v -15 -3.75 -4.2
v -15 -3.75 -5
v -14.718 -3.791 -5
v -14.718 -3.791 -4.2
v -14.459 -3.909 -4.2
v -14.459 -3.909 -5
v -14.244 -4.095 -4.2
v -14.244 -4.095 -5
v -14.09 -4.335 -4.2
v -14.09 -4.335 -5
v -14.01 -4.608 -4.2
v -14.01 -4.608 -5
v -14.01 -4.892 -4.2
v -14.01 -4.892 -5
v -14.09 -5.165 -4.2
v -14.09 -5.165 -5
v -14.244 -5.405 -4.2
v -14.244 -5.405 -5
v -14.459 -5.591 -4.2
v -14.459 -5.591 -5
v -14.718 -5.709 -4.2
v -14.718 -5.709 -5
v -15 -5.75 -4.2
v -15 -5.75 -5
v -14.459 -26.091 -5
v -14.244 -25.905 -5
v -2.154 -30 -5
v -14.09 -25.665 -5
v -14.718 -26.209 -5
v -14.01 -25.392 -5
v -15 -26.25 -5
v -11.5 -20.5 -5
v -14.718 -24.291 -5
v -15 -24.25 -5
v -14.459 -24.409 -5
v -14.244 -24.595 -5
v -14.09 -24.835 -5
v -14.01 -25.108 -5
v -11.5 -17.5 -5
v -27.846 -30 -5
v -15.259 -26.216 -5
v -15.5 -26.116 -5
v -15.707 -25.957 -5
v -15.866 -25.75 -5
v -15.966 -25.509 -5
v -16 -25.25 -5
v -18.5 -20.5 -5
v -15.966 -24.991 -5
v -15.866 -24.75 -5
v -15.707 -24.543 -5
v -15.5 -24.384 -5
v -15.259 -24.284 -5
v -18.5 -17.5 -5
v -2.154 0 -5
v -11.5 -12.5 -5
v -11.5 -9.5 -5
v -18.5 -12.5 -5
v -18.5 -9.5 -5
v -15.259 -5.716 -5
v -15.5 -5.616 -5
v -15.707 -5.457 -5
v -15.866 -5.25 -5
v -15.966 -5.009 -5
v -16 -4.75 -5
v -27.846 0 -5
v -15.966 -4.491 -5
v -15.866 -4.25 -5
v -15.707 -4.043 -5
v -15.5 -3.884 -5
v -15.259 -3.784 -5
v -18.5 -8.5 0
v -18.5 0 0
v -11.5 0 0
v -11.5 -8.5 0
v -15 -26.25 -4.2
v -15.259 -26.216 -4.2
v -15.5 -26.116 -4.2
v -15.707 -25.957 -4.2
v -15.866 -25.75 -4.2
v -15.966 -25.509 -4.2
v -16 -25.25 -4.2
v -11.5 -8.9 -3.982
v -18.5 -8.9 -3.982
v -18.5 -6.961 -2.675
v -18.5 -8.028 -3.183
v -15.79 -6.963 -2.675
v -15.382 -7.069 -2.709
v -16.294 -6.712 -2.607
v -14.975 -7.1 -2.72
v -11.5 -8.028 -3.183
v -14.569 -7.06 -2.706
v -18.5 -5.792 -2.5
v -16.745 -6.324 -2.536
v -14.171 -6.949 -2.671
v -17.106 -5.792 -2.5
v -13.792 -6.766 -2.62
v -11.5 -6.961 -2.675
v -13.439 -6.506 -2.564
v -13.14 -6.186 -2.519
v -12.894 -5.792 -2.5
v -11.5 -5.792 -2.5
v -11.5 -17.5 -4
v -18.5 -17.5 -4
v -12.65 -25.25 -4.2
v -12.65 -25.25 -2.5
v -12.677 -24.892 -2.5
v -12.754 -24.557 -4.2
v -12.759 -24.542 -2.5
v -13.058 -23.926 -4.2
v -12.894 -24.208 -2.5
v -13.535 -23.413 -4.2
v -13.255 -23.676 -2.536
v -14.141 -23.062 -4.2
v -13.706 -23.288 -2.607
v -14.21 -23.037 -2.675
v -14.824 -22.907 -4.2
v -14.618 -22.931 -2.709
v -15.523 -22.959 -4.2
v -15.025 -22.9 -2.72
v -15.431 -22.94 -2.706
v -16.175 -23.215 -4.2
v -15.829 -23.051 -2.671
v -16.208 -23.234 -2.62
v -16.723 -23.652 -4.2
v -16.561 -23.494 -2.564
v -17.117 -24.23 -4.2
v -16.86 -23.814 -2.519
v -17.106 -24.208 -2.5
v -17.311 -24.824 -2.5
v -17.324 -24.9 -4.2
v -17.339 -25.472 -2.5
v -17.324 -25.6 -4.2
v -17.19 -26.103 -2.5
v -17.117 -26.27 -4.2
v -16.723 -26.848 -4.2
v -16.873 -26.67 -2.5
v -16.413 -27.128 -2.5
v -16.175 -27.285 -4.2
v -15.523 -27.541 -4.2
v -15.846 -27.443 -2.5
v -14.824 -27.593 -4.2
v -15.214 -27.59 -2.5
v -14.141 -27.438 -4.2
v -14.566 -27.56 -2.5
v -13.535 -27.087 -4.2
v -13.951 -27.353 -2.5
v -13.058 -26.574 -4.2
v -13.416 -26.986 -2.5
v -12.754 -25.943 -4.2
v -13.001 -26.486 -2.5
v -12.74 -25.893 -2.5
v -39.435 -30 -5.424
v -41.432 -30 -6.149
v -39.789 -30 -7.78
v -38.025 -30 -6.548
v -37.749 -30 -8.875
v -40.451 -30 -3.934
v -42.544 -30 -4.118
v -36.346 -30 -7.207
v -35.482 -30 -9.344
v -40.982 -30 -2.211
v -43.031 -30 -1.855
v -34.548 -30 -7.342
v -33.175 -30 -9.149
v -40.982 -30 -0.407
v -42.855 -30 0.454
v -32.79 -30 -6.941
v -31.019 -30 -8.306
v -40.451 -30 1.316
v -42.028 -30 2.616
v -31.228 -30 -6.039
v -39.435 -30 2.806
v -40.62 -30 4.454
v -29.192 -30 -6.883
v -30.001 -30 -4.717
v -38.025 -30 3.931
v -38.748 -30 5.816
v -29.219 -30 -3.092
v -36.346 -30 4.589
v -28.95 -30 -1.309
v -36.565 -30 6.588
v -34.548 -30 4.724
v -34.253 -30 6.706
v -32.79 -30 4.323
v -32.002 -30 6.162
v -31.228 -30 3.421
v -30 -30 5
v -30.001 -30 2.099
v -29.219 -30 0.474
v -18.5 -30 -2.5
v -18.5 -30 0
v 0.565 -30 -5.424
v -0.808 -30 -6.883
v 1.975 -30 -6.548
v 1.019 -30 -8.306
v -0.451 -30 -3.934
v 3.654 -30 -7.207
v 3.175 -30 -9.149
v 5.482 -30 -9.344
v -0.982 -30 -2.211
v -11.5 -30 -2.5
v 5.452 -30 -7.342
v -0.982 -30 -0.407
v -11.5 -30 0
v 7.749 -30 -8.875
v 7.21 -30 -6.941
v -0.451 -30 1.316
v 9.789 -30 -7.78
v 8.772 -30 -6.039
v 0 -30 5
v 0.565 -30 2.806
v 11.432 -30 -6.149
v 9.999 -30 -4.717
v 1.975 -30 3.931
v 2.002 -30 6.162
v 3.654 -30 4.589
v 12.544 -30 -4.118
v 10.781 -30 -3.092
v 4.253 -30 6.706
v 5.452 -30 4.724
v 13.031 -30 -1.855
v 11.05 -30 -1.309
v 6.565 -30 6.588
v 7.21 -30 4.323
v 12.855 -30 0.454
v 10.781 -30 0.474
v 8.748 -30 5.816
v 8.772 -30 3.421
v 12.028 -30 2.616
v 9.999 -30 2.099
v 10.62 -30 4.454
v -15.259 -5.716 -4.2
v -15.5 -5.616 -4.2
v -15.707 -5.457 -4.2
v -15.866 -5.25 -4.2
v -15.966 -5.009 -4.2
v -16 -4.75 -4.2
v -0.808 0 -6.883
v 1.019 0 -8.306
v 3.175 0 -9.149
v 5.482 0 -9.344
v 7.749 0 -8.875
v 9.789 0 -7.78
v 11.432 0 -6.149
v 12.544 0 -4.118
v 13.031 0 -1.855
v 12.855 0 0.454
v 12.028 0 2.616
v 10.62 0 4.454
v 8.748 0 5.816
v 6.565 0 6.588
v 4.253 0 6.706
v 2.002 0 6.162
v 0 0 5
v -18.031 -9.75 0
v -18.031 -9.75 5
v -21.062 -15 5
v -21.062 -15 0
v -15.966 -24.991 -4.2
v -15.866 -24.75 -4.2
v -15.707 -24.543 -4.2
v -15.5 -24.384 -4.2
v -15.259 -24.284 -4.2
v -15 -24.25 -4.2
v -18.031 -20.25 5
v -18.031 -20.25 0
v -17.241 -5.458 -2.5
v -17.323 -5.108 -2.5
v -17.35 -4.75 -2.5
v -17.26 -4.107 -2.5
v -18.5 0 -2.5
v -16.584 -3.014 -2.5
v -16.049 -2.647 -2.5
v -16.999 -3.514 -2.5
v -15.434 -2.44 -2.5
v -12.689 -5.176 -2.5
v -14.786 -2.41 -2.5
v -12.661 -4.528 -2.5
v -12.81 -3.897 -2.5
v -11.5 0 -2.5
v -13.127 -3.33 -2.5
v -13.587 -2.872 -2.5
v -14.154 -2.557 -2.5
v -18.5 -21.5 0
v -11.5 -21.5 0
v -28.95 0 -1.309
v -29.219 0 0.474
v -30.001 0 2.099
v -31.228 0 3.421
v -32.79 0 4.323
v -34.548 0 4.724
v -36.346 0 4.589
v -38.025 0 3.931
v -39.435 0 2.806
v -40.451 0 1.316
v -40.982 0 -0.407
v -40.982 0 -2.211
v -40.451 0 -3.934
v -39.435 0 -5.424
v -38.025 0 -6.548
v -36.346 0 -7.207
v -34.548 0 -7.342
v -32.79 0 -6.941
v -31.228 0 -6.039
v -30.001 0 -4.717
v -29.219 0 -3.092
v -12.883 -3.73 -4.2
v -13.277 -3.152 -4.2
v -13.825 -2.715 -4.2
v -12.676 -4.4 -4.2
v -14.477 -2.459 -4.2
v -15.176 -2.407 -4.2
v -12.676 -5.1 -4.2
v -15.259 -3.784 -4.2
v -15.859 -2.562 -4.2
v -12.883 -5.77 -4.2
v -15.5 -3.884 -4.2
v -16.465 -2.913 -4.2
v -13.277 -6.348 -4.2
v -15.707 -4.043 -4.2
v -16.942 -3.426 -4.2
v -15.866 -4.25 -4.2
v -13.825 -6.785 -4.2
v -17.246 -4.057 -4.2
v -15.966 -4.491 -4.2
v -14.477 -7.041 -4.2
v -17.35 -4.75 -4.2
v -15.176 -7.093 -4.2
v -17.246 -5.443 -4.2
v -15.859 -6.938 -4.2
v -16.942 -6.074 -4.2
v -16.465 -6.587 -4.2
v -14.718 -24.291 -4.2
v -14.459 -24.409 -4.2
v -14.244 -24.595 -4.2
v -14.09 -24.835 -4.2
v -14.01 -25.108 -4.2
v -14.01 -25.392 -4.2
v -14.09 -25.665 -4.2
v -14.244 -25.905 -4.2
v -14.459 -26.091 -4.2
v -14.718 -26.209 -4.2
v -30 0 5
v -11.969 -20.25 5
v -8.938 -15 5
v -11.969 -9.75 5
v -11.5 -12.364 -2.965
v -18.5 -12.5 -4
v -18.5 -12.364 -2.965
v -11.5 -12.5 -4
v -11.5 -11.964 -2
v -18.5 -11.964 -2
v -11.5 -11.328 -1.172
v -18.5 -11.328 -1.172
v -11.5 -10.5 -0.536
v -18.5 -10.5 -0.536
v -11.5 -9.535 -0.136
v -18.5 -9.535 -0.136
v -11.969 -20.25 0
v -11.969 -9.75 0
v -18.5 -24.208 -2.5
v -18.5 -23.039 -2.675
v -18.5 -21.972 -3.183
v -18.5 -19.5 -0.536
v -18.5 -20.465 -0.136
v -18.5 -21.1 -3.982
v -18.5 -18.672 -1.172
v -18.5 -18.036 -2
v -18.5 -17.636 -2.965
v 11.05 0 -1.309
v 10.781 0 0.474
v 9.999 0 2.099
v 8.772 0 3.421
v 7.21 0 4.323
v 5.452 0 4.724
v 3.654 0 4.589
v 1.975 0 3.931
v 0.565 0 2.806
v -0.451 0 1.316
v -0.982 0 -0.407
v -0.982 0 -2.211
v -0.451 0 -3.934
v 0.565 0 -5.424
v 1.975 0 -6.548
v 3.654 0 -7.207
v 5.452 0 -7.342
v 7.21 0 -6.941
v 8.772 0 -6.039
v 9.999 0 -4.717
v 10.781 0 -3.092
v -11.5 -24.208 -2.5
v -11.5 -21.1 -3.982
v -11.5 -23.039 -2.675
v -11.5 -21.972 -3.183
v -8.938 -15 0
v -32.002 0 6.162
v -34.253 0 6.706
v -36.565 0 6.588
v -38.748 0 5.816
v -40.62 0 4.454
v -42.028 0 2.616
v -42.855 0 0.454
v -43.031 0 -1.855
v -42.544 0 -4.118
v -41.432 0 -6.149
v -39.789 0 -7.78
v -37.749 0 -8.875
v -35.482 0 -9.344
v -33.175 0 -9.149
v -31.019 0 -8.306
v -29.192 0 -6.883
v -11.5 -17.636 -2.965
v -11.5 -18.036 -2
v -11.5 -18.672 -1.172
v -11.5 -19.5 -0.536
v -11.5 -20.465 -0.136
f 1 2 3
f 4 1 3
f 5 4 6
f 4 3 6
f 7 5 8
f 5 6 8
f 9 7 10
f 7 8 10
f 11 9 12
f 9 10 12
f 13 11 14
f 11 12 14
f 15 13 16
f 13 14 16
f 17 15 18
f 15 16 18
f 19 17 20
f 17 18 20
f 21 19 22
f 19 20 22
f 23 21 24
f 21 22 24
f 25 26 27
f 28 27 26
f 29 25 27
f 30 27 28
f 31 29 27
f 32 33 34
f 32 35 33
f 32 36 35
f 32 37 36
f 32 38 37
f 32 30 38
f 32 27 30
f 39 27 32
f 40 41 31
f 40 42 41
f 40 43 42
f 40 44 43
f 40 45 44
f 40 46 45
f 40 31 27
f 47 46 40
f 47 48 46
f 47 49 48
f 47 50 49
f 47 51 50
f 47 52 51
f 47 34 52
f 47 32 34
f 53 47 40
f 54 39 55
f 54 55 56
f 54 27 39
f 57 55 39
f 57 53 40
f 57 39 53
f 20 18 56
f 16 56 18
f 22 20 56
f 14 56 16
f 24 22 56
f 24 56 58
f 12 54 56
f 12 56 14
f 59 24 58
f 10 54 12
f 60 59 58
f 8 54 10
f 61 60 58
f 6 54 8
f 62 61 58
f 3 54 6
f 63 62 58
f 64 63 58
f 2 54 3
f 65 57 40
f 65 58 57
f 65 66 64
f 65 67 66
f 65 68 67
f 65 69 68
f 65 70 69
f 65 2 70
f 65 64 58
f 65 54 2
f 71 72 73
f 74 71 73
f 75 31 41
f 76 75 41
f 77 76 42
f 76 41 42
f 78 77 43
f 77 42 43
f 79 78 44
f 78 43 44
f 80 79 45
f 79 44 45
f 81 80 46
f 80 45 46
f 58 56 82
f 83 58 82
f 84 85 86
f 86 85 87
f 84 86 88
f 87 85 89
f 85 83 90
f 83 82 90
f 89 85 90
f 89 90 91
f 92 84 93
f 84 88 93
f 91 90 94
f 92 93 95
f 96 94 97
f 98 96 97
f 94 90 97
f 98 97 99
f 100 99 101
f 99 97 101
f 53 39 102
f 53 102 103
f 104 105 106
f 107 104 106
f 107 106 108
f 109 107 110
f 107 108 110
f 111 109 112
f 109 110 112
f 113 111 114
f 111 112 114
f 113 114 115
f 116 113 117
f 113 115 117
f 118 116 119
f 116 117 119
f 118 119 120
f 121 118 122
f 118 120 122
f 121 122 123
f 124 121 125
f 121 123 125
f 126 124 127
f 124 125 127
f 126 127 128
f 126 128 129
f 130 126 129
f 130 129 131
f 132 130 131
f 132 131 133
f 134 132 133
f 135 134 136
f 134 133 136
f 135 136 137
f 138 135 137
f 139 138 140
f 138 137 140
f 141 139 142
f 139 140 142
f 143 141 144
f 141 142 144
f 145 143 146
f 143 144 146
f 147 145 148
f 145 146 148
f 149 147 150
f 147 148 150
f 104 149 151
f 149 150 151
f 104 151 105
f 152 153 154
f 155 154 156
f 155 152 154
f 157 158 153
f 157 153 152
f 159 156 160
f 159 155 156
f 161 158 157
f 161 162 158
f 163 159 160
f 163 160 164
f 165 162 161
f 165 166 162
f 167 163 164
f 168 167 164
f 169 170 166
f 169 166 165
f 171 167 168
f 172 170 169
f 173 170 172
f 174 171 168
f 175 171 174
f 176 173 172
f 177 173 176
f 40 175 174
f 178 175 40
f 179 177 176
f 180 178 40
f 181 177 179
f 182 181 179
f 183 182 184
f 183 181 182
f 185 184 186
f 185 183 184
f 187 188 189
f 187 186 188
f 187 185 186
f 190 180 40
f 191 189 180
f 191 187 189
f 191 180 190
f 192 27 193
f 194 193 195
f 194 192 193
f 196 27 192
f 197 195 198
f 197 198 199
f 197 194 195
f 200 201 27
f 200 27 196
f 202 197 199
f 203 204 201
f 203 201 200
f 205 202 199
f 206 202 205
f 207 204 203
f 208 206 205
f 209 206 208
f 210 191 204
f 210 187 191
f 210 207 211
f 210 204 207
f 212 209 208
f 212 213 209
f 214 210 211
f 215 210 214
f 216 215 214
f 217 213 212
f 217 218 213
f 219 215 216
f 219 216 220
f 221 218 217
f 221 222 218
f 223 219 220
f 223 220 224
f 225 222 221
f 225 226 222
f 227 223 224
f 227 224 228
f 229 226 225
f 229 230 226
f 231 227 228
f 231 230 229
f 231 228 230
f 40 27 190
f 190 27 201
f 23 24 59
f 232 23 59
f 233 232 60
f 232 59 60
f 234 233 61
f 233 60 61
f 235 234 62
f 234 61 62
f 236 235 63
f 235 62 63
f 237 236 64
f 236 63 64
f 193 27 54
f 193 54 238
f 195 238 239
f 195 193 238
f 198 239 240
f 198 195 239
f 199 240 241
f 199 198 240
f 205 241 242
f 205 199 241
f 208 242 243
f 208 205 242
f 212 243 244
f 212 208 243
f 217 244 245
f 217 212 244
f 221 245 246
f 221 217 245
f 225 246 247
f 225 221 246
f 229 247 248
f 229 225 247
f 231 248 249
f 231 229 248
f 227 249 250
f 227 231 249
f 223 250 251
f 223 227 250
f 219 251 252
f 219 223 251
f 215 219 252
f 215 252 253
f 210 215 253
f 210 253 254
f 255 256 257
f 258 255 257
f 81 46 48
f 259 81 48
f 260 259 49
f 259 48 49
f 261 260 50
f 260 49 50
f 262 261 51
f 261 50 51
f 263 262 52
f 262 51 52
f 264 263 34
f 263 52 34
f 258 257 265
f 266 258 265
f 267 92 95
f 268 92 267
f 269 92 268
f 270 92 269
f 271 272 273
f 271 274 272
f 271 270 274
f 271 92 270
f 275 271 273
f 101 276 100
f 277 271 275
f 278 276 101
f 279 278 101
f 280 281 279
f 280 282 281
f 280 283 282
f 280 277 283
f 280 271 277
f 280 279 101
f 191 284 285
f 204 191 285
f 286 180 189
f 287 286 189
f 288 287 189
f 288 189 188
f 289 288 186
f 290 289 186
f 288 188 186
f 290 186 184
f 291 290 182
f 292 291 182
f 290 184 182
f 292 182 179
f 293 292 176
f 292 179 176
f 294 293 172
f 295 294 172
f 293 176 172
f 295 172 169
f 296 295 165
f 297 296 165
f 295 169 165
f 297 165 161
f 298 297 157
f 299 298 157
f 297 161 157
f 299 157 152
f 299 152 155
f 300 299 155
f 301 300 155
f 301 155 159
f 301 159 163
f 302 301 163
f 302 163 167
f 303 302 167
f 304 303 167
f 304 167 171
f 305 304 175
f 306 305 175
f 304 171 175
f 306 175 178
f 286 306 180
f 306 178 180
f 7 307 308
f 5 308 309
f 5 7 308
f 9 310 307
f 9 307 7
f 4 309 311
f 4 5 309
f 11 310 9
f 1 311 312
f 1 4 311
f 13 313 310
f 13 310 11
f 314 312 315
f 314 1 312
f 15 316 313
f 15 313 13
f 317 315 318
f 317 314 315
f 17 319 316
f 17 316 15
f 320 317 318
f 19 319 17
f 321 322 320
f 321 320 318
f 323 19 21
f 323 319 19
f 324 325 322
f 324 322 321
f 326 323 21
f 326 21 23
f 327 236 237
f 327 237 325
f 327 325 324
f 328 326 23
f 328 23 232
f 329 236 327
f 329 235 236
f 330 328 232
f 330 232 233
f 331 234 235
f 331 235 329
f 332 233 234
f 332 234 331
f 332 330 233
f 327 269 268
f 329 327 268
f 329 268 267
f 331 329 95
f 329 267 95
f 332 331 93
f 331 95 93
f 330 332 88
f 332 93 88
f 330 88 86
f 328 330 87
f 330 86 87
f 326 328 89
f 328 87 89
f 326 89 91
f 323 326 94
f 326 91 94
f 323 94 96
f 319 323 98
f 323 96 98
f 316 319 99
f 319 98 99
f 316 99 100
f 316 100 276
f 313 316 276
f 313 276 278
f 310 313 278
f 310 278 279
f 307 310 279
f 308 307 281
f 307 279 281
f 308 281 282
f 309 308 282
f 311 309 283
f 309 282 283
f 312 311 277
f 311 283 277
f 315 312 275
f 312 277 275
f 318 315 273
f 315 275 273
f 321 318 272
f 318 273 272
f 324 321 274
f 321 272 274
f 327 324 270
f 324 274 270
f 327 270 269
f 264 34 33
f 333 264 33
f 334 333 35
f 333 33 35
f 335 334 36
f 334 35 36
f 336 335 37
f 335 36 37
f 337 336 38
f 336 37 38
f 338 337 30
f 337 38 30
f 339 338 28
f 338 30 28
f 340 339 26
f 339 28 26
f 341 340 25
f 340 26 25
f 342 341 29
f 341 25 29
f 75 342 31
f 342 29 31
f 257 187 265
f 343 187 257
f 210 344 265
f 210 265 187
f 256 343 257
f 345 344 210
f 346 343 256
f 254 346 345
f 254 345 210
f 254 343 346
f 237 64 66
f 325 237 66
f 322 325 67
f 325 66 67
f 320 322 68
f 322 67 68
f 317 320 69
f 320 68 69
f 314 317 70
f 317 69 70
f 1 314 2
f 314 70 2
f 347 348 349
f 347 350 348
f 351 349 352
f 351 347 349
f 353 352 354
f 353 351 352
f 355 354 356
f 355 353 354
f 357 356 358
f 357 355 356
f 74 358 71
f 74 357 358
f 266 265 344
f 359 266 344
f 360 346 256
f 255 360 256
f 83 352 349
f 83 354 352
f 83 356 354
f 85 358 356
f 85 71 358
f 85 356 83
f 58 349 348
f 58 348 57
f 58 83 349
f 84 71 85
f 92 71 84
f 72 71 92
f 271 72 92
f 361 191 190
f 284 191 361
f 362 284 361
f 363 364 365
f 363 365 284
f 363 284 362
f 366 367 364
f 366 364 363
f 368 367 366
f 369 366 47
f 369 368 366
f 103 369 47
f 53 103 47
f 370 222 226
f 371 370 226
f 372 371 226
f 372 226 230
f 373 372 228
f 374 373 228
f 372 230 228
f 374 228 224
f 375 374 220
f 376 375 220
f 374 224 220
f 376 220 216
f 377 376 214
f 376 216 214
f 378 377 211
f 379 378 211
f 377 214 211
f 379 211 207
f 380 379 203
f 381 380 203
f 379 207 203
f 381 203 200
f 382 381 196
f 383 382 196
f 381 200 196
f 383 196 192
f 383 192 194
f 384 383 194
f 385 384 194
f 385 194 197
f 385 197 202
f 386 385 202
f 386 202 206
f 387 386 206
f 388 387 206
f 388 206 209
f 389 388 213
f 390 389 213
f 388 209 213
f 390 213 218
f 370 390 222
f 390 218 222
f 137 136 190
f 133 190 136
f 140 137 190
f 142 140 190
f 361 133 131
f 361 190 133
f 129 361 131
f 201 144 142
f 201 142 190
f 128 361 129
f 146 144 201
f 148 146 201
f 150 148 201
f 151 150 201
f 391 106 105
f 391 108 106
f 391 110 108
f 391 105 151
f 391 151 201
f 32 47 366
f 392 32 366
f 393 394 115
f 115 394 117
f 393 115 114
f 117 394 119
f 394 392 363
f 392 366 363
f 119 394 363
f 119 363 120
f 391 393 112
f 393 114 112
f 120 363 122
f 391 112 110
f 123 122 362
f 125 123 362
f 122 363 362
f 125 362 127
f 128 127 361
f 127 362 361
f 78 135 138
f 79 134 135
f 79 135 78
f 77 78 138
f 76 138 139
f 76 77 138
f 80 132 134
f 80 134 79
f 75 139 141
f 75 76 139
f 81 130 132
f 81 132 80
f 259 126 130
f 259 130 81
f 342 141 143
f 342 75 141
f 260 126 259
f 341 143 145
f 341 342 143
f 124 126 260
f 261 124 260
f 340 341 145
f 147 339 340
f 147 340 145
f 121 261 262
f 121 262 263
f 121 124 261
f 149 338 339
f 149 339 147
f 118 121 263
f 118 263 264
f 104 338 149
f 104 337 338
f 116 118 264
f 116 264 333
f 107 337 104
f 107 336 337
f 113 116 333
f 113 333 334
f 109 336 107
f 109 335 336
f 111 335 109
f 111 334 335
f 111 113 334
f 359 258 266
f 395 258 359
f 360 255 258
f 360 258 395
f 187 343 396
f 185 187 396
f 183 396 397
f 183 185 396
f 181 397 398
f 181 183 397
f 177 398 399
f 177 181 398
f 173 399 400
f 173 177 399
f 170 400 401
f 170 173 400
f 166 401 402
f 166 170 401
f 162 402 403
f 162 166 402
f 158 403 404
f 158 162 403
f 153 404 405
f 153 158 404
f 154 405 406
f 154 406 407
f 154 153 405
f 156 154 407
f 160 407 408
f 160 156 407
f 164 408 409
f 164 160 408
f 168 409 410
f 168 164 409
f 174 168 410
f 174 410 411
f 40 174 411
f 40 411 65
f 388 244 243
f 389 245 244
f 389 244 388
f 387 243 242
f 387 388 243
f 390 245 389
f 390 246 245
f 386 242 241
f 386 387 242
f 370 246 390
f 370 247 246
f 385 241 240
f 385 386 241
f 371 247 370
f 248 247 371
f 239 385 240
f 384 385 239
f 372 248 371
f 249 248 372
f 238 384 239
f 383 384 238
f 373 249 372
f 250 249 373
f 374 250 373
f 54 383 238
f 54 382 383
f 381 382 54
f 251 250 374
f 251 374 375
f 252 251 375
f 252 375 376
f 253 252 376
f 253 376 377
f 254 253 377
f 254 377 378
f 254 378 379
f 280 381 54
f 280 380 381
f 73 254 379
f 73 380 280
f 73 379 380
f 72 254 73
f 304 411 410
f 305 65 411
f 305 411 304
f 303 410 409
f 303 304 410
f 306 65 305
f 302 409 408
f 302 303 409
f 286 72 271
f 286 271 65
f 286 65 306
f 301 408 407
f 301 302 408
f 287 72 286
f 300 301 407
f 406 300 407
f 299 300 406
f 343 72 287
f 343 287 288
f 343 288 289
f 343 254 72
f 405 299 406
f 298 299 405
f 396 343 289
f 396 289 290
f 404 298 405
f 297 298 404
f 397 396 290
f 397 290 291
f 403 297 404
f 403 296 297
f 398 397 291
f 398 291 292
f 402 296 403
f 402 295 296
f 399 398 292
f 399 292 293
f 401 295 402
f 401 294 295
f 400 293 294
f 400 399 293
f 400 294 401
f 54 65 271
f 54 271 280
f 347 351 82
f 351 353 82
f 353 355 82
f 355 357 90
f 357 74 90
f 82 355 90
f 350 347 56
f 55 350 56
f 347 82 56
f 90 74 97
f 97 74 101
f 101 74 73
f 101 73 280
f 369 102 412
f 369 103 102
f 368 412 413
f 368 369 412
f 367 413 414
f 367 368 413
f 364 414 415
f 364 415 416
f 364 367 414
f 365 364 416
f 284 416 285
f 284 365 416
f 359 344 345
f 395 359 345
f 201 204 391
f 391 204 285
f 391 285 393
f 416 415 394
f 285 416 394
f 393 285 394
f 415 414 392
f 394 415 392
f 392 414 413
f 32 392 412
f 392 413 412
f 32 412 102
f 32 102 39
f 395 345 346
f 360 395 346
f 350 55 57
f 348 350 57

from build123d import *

# Parameters (mm, degrees)
SKICA1_W                 = 30
SKICA1_H                 = 30
P_IDAT_VYSUNUT_M1_DEPTH  = 5
SKICA2_W                 = 30
SKICA2_H                 = 30
P_IDAT_VYSUNUT_M2_DEPTH  = 5
ODEBRAT_VYSUNUT_M1_DEPTH = 30
ODEBRAT_VYSUNUT_M2_DEPTH = 30
SKICA7_W                 = 7
SKICA7_H                 = 2.5
ODEBRAT_VYSUNUT_M3_DEPTH = 30
SKICA10_R                = 8.05
SKICA10_R_2              = 6.05
P_IDAT_VYSUNUT_M7_DEPTH  = 30
SKICA13_W                = 7
SKICA13_H                = 3
ODEBRAT_VYSUNUT_M5_DEPTH = 2.5
SKICA15_R                = 2.35
ODEBRAT_VYSUNUT_M6_DEPTH = 1.7
SKICA16_W                = 3.5
SKICA16_H                = 5
P_IDAT_VYSUNUT_M8_DEPTH  = 5
ODEBRAT_VYSUNUT_M7_DEPTH = 0.8
ZAOBLIT1_R               = 4
ZAOBLIT2_R               = 4
ODEBRAT_VYSUNUT_M8_DEPTH = 5


with BuildPart() as part:
    # Skica1 → Přidat vysunutím1 (new body)
    with BuildSketch(Plane.XY):
        with Locations((-15, -15)):
            Rectangle(SKICA1_W, SKICA1_H)
    extrude(amount=P_IDAT_VYSUNUT_M1_DEPTH)

    # Skica2 → Přidat vysunutím2 (add)
    with BuildSketch(Plane(origin=(0, 0, 0), x_dir=(-1, 0, 0), z_dir=(0, 0, -1))):
        with Locations((15, -15)):
            Rectangle(SKICA2_W, SKICA2_H)
    extrude(amount=P_IDAT_VYSUNUT_M2_DEPTH)

    # Skica4 → Odebrat vysunutím1 (cut)
    with BuildSketch(Plane(origin=(0, -30, 0), x_dir=(-1, 0, 0), z_dir=(0, -1, 0))):
        with BuildLine():
            Line((30, -5), (30, 5))
            ThreePointArc((30, 5), (28.123635209, 0), (30, -5))
        make_face()
    extrude(amount=-ODEBRAT_VYSUNUT_M1_DEPTH, mode=Mode.SUBTRACT)

    # Skica5 → Odebrat vysunutím2 (cut)
    with BuildSketch(Plane(origin=(0, -30, 0), x_dir=(-1, 0, 0), z_dir=(0, -1, 0))):
        with BuildLine():
            ThreePointArc((0, -5), (1.909830056, 0), (0, 5))
            Line((0, 5), (0, -5))
        make_face()
    extrude(amount=-ODEBRAT_VYSUNUT_M2_DEPTH, mode=Mode.SUBTRACT)

    # Skica7 → Odebrat vysunutím3 (cut)
    with BuildSketch(Plane(origin=(0, 0, 0), x_dir=(1, 0, 0), z_dir=(0, 1, 0))):
        with Locations((-15, 1.25)):
            Rectangle(SKICA7_W, SKICA7_H)
    extrude(amount=-ODEBRAT_VYSUNUT_M3_DEPTH, mode=Mode.SUBTRACT)

    # Skica10 → Přidat vysunutím7 (add)
    # profile 1 of 2: a face of its own
    with BuildSketch(Plane.XZ.offset(30)):
        with Locations((-35, -1.308922253)):
            Circle(SKICA10_R)
        with Locations((-35, -1.308922253)):
            Circle(SKICA10_R_2, mode=Mode.SUBTRACT)
    # profile 2 of 2: a face of its own
    with BuildSketch(Plane.XZ.offset(30)):
        with Locations((5, -1.308922253)):
            Circle(SKICA10_R)
        with Locations((5, -1.308922253)):
            Circle(SKICA10_R_2, mode=Mode.SUBTRACT)
    extrude(amount=-P_IDAT_VYSUNUT_M7_DEPTH)

    # Skica13 → Odebrat vysunutím5 (cut)
    with BuildSketch(Plane(origin=(0, 0, -5), x_dir=(-1, 0, 0), z_dir=(0, 0, -1))):
        with Locations((15, -19)):
            Rectangle(SKICA13_W, SKICA13_H)
        with Locations((15, -11)):
            Rectangle(SKICA13_W, SKICA13_H)
    extrude(amount=-ODEBRAT_VYSUNUT_M5_DEPTH, mode=Mode.SUBTRACT)

    # Skica15 → Odebrat vysunutím6 (cut)
    with BuildSketch(Plane.XY.offset(-2.5)):
        with Locations((-15, -25.25)):
            Circle(SKICA15_R)
        with Locations(Location((-15, -4.75, 0), (0, 0, 180))):
            Circle(SKICA15_R)
    extrude(amount=-ODEBRAT_VYSUNUT_M6_DEPTH, mode=Mode.SUBTRACT)

    # Skica16 → Přidat vysunutím8 (add)
    with BuildSketch(Plane(origin=(0, 0, -5), x_dir=(-1, 0, 0), z_dir=(0, 0, -1))):
        with Locations((13.25, -15)):
            Rectangle(SKICA16_W, SKICA16_H)
        with Locations((16.75, -15)):
            Rectangle(SKICA16_W, SKICA16_H)
    extrude(amount=-P_IDAT_VYSUNUT_M8_DEPTH)

    # Skica16<3> → Odebrat vysunutím7 (cut)
    with BuildSketch(Plane(origin=(0, 0, -5), x_dir=(-1, 0, 0), z_dir=(0, 0, -1))):
        with BuildLine():
            ThreePointArc((16, -4.75), (15.707106781, -4.042893219), (15, -3.75))
            Line((15, -3.75), (15, -5.75))
            ThreePointArc((15, -5.75), (15.707106781, -5.457106781), (16, -4.75))
        make_face()
        with BuildLine():
            Line((15, -5.75), (15, -3.75))
            ThreePointArc((15, -3.75), (14, -4.75), (15, -5.75))
        make_face()
        with BuildLine():
            ThreePointArc((15, -24.25), (14, -25.25), (15, -26.25))
            Line((15, -26.25), (15, -24.25))
        make_face()
        with BuildLine():
            Line((15, -24.25), (15, -26.25))
            ThreePointArc((15, -26.25), (15.707106781, -25.957106781), (16, -25.25))
            ThreePointArc((16, -25.25), (15.707106781, -24.542893219), (15, -24.25))
        make_face()
    extrude(amount=-ODEBRAT_VYSUNUT_M7_DEPTH, mode=Mode.SUBTRACT)

    # Zaoblit1
    zaoblit1_edges = [part.edges().sort_by_distance(p)[0] for p in [
        (-15, -17.5, 0),
        (-15, -12.5, 0),
    ]]
    fillet(zaoblit1_edges, radius=ZAOBLIT1_R)

    # Zaoblit2
    # the kernel refuses this fillet: 4 mm, written as the material it takes off along each edge
    with BuildSketch(Plane(origin=(-18.5, -20.5, -2.5), x_dir=(0, 0, -1), z_dir=(1, 0, 0)), Plane(origin=(-11.5, -9.5, -2.5), x_dir=(0, 0, -1), z_dir=(-1, 0, 0))) as zaoblit2_piece_1:
        with BuildLine():
            CenterArc((4, -3.708099244), ZAOBLIT2_R, 112.024312837, 67.975687163)
            Line((0, -3.708099244), (-0.08, -3.708099244))
            Line((-0.08, -3.708099244), (-0.08, 0))
            Line((-0.08, 0), (0, 0.08))
            ThreePointArc((0, 0.08), (1.25, 0.08), (2.47, 0.074161985))
            Line((2.47, 0.074161985), (2.5, 0))
        make_face()
    extrude(amount=7, mode=Mode.SUBTRACT)

    # Skica17 → Odebrat vysunutím8 (cut)
    with BuildSketch(Plane.XY.offset(5)):
        Polygon((-8.937822174, -15), (-11.968911087, -9.75), (-18.031088913, -9.75), (-21.062177826, -15), (-18.031088913, -20.25), (-11.968911087, -20.25), align=None)
    extrude(amount=-ODEBRAT_VYSUNUT_M8_DEPTH, mode=Mode.SUBTRACT)


solid = part.part
